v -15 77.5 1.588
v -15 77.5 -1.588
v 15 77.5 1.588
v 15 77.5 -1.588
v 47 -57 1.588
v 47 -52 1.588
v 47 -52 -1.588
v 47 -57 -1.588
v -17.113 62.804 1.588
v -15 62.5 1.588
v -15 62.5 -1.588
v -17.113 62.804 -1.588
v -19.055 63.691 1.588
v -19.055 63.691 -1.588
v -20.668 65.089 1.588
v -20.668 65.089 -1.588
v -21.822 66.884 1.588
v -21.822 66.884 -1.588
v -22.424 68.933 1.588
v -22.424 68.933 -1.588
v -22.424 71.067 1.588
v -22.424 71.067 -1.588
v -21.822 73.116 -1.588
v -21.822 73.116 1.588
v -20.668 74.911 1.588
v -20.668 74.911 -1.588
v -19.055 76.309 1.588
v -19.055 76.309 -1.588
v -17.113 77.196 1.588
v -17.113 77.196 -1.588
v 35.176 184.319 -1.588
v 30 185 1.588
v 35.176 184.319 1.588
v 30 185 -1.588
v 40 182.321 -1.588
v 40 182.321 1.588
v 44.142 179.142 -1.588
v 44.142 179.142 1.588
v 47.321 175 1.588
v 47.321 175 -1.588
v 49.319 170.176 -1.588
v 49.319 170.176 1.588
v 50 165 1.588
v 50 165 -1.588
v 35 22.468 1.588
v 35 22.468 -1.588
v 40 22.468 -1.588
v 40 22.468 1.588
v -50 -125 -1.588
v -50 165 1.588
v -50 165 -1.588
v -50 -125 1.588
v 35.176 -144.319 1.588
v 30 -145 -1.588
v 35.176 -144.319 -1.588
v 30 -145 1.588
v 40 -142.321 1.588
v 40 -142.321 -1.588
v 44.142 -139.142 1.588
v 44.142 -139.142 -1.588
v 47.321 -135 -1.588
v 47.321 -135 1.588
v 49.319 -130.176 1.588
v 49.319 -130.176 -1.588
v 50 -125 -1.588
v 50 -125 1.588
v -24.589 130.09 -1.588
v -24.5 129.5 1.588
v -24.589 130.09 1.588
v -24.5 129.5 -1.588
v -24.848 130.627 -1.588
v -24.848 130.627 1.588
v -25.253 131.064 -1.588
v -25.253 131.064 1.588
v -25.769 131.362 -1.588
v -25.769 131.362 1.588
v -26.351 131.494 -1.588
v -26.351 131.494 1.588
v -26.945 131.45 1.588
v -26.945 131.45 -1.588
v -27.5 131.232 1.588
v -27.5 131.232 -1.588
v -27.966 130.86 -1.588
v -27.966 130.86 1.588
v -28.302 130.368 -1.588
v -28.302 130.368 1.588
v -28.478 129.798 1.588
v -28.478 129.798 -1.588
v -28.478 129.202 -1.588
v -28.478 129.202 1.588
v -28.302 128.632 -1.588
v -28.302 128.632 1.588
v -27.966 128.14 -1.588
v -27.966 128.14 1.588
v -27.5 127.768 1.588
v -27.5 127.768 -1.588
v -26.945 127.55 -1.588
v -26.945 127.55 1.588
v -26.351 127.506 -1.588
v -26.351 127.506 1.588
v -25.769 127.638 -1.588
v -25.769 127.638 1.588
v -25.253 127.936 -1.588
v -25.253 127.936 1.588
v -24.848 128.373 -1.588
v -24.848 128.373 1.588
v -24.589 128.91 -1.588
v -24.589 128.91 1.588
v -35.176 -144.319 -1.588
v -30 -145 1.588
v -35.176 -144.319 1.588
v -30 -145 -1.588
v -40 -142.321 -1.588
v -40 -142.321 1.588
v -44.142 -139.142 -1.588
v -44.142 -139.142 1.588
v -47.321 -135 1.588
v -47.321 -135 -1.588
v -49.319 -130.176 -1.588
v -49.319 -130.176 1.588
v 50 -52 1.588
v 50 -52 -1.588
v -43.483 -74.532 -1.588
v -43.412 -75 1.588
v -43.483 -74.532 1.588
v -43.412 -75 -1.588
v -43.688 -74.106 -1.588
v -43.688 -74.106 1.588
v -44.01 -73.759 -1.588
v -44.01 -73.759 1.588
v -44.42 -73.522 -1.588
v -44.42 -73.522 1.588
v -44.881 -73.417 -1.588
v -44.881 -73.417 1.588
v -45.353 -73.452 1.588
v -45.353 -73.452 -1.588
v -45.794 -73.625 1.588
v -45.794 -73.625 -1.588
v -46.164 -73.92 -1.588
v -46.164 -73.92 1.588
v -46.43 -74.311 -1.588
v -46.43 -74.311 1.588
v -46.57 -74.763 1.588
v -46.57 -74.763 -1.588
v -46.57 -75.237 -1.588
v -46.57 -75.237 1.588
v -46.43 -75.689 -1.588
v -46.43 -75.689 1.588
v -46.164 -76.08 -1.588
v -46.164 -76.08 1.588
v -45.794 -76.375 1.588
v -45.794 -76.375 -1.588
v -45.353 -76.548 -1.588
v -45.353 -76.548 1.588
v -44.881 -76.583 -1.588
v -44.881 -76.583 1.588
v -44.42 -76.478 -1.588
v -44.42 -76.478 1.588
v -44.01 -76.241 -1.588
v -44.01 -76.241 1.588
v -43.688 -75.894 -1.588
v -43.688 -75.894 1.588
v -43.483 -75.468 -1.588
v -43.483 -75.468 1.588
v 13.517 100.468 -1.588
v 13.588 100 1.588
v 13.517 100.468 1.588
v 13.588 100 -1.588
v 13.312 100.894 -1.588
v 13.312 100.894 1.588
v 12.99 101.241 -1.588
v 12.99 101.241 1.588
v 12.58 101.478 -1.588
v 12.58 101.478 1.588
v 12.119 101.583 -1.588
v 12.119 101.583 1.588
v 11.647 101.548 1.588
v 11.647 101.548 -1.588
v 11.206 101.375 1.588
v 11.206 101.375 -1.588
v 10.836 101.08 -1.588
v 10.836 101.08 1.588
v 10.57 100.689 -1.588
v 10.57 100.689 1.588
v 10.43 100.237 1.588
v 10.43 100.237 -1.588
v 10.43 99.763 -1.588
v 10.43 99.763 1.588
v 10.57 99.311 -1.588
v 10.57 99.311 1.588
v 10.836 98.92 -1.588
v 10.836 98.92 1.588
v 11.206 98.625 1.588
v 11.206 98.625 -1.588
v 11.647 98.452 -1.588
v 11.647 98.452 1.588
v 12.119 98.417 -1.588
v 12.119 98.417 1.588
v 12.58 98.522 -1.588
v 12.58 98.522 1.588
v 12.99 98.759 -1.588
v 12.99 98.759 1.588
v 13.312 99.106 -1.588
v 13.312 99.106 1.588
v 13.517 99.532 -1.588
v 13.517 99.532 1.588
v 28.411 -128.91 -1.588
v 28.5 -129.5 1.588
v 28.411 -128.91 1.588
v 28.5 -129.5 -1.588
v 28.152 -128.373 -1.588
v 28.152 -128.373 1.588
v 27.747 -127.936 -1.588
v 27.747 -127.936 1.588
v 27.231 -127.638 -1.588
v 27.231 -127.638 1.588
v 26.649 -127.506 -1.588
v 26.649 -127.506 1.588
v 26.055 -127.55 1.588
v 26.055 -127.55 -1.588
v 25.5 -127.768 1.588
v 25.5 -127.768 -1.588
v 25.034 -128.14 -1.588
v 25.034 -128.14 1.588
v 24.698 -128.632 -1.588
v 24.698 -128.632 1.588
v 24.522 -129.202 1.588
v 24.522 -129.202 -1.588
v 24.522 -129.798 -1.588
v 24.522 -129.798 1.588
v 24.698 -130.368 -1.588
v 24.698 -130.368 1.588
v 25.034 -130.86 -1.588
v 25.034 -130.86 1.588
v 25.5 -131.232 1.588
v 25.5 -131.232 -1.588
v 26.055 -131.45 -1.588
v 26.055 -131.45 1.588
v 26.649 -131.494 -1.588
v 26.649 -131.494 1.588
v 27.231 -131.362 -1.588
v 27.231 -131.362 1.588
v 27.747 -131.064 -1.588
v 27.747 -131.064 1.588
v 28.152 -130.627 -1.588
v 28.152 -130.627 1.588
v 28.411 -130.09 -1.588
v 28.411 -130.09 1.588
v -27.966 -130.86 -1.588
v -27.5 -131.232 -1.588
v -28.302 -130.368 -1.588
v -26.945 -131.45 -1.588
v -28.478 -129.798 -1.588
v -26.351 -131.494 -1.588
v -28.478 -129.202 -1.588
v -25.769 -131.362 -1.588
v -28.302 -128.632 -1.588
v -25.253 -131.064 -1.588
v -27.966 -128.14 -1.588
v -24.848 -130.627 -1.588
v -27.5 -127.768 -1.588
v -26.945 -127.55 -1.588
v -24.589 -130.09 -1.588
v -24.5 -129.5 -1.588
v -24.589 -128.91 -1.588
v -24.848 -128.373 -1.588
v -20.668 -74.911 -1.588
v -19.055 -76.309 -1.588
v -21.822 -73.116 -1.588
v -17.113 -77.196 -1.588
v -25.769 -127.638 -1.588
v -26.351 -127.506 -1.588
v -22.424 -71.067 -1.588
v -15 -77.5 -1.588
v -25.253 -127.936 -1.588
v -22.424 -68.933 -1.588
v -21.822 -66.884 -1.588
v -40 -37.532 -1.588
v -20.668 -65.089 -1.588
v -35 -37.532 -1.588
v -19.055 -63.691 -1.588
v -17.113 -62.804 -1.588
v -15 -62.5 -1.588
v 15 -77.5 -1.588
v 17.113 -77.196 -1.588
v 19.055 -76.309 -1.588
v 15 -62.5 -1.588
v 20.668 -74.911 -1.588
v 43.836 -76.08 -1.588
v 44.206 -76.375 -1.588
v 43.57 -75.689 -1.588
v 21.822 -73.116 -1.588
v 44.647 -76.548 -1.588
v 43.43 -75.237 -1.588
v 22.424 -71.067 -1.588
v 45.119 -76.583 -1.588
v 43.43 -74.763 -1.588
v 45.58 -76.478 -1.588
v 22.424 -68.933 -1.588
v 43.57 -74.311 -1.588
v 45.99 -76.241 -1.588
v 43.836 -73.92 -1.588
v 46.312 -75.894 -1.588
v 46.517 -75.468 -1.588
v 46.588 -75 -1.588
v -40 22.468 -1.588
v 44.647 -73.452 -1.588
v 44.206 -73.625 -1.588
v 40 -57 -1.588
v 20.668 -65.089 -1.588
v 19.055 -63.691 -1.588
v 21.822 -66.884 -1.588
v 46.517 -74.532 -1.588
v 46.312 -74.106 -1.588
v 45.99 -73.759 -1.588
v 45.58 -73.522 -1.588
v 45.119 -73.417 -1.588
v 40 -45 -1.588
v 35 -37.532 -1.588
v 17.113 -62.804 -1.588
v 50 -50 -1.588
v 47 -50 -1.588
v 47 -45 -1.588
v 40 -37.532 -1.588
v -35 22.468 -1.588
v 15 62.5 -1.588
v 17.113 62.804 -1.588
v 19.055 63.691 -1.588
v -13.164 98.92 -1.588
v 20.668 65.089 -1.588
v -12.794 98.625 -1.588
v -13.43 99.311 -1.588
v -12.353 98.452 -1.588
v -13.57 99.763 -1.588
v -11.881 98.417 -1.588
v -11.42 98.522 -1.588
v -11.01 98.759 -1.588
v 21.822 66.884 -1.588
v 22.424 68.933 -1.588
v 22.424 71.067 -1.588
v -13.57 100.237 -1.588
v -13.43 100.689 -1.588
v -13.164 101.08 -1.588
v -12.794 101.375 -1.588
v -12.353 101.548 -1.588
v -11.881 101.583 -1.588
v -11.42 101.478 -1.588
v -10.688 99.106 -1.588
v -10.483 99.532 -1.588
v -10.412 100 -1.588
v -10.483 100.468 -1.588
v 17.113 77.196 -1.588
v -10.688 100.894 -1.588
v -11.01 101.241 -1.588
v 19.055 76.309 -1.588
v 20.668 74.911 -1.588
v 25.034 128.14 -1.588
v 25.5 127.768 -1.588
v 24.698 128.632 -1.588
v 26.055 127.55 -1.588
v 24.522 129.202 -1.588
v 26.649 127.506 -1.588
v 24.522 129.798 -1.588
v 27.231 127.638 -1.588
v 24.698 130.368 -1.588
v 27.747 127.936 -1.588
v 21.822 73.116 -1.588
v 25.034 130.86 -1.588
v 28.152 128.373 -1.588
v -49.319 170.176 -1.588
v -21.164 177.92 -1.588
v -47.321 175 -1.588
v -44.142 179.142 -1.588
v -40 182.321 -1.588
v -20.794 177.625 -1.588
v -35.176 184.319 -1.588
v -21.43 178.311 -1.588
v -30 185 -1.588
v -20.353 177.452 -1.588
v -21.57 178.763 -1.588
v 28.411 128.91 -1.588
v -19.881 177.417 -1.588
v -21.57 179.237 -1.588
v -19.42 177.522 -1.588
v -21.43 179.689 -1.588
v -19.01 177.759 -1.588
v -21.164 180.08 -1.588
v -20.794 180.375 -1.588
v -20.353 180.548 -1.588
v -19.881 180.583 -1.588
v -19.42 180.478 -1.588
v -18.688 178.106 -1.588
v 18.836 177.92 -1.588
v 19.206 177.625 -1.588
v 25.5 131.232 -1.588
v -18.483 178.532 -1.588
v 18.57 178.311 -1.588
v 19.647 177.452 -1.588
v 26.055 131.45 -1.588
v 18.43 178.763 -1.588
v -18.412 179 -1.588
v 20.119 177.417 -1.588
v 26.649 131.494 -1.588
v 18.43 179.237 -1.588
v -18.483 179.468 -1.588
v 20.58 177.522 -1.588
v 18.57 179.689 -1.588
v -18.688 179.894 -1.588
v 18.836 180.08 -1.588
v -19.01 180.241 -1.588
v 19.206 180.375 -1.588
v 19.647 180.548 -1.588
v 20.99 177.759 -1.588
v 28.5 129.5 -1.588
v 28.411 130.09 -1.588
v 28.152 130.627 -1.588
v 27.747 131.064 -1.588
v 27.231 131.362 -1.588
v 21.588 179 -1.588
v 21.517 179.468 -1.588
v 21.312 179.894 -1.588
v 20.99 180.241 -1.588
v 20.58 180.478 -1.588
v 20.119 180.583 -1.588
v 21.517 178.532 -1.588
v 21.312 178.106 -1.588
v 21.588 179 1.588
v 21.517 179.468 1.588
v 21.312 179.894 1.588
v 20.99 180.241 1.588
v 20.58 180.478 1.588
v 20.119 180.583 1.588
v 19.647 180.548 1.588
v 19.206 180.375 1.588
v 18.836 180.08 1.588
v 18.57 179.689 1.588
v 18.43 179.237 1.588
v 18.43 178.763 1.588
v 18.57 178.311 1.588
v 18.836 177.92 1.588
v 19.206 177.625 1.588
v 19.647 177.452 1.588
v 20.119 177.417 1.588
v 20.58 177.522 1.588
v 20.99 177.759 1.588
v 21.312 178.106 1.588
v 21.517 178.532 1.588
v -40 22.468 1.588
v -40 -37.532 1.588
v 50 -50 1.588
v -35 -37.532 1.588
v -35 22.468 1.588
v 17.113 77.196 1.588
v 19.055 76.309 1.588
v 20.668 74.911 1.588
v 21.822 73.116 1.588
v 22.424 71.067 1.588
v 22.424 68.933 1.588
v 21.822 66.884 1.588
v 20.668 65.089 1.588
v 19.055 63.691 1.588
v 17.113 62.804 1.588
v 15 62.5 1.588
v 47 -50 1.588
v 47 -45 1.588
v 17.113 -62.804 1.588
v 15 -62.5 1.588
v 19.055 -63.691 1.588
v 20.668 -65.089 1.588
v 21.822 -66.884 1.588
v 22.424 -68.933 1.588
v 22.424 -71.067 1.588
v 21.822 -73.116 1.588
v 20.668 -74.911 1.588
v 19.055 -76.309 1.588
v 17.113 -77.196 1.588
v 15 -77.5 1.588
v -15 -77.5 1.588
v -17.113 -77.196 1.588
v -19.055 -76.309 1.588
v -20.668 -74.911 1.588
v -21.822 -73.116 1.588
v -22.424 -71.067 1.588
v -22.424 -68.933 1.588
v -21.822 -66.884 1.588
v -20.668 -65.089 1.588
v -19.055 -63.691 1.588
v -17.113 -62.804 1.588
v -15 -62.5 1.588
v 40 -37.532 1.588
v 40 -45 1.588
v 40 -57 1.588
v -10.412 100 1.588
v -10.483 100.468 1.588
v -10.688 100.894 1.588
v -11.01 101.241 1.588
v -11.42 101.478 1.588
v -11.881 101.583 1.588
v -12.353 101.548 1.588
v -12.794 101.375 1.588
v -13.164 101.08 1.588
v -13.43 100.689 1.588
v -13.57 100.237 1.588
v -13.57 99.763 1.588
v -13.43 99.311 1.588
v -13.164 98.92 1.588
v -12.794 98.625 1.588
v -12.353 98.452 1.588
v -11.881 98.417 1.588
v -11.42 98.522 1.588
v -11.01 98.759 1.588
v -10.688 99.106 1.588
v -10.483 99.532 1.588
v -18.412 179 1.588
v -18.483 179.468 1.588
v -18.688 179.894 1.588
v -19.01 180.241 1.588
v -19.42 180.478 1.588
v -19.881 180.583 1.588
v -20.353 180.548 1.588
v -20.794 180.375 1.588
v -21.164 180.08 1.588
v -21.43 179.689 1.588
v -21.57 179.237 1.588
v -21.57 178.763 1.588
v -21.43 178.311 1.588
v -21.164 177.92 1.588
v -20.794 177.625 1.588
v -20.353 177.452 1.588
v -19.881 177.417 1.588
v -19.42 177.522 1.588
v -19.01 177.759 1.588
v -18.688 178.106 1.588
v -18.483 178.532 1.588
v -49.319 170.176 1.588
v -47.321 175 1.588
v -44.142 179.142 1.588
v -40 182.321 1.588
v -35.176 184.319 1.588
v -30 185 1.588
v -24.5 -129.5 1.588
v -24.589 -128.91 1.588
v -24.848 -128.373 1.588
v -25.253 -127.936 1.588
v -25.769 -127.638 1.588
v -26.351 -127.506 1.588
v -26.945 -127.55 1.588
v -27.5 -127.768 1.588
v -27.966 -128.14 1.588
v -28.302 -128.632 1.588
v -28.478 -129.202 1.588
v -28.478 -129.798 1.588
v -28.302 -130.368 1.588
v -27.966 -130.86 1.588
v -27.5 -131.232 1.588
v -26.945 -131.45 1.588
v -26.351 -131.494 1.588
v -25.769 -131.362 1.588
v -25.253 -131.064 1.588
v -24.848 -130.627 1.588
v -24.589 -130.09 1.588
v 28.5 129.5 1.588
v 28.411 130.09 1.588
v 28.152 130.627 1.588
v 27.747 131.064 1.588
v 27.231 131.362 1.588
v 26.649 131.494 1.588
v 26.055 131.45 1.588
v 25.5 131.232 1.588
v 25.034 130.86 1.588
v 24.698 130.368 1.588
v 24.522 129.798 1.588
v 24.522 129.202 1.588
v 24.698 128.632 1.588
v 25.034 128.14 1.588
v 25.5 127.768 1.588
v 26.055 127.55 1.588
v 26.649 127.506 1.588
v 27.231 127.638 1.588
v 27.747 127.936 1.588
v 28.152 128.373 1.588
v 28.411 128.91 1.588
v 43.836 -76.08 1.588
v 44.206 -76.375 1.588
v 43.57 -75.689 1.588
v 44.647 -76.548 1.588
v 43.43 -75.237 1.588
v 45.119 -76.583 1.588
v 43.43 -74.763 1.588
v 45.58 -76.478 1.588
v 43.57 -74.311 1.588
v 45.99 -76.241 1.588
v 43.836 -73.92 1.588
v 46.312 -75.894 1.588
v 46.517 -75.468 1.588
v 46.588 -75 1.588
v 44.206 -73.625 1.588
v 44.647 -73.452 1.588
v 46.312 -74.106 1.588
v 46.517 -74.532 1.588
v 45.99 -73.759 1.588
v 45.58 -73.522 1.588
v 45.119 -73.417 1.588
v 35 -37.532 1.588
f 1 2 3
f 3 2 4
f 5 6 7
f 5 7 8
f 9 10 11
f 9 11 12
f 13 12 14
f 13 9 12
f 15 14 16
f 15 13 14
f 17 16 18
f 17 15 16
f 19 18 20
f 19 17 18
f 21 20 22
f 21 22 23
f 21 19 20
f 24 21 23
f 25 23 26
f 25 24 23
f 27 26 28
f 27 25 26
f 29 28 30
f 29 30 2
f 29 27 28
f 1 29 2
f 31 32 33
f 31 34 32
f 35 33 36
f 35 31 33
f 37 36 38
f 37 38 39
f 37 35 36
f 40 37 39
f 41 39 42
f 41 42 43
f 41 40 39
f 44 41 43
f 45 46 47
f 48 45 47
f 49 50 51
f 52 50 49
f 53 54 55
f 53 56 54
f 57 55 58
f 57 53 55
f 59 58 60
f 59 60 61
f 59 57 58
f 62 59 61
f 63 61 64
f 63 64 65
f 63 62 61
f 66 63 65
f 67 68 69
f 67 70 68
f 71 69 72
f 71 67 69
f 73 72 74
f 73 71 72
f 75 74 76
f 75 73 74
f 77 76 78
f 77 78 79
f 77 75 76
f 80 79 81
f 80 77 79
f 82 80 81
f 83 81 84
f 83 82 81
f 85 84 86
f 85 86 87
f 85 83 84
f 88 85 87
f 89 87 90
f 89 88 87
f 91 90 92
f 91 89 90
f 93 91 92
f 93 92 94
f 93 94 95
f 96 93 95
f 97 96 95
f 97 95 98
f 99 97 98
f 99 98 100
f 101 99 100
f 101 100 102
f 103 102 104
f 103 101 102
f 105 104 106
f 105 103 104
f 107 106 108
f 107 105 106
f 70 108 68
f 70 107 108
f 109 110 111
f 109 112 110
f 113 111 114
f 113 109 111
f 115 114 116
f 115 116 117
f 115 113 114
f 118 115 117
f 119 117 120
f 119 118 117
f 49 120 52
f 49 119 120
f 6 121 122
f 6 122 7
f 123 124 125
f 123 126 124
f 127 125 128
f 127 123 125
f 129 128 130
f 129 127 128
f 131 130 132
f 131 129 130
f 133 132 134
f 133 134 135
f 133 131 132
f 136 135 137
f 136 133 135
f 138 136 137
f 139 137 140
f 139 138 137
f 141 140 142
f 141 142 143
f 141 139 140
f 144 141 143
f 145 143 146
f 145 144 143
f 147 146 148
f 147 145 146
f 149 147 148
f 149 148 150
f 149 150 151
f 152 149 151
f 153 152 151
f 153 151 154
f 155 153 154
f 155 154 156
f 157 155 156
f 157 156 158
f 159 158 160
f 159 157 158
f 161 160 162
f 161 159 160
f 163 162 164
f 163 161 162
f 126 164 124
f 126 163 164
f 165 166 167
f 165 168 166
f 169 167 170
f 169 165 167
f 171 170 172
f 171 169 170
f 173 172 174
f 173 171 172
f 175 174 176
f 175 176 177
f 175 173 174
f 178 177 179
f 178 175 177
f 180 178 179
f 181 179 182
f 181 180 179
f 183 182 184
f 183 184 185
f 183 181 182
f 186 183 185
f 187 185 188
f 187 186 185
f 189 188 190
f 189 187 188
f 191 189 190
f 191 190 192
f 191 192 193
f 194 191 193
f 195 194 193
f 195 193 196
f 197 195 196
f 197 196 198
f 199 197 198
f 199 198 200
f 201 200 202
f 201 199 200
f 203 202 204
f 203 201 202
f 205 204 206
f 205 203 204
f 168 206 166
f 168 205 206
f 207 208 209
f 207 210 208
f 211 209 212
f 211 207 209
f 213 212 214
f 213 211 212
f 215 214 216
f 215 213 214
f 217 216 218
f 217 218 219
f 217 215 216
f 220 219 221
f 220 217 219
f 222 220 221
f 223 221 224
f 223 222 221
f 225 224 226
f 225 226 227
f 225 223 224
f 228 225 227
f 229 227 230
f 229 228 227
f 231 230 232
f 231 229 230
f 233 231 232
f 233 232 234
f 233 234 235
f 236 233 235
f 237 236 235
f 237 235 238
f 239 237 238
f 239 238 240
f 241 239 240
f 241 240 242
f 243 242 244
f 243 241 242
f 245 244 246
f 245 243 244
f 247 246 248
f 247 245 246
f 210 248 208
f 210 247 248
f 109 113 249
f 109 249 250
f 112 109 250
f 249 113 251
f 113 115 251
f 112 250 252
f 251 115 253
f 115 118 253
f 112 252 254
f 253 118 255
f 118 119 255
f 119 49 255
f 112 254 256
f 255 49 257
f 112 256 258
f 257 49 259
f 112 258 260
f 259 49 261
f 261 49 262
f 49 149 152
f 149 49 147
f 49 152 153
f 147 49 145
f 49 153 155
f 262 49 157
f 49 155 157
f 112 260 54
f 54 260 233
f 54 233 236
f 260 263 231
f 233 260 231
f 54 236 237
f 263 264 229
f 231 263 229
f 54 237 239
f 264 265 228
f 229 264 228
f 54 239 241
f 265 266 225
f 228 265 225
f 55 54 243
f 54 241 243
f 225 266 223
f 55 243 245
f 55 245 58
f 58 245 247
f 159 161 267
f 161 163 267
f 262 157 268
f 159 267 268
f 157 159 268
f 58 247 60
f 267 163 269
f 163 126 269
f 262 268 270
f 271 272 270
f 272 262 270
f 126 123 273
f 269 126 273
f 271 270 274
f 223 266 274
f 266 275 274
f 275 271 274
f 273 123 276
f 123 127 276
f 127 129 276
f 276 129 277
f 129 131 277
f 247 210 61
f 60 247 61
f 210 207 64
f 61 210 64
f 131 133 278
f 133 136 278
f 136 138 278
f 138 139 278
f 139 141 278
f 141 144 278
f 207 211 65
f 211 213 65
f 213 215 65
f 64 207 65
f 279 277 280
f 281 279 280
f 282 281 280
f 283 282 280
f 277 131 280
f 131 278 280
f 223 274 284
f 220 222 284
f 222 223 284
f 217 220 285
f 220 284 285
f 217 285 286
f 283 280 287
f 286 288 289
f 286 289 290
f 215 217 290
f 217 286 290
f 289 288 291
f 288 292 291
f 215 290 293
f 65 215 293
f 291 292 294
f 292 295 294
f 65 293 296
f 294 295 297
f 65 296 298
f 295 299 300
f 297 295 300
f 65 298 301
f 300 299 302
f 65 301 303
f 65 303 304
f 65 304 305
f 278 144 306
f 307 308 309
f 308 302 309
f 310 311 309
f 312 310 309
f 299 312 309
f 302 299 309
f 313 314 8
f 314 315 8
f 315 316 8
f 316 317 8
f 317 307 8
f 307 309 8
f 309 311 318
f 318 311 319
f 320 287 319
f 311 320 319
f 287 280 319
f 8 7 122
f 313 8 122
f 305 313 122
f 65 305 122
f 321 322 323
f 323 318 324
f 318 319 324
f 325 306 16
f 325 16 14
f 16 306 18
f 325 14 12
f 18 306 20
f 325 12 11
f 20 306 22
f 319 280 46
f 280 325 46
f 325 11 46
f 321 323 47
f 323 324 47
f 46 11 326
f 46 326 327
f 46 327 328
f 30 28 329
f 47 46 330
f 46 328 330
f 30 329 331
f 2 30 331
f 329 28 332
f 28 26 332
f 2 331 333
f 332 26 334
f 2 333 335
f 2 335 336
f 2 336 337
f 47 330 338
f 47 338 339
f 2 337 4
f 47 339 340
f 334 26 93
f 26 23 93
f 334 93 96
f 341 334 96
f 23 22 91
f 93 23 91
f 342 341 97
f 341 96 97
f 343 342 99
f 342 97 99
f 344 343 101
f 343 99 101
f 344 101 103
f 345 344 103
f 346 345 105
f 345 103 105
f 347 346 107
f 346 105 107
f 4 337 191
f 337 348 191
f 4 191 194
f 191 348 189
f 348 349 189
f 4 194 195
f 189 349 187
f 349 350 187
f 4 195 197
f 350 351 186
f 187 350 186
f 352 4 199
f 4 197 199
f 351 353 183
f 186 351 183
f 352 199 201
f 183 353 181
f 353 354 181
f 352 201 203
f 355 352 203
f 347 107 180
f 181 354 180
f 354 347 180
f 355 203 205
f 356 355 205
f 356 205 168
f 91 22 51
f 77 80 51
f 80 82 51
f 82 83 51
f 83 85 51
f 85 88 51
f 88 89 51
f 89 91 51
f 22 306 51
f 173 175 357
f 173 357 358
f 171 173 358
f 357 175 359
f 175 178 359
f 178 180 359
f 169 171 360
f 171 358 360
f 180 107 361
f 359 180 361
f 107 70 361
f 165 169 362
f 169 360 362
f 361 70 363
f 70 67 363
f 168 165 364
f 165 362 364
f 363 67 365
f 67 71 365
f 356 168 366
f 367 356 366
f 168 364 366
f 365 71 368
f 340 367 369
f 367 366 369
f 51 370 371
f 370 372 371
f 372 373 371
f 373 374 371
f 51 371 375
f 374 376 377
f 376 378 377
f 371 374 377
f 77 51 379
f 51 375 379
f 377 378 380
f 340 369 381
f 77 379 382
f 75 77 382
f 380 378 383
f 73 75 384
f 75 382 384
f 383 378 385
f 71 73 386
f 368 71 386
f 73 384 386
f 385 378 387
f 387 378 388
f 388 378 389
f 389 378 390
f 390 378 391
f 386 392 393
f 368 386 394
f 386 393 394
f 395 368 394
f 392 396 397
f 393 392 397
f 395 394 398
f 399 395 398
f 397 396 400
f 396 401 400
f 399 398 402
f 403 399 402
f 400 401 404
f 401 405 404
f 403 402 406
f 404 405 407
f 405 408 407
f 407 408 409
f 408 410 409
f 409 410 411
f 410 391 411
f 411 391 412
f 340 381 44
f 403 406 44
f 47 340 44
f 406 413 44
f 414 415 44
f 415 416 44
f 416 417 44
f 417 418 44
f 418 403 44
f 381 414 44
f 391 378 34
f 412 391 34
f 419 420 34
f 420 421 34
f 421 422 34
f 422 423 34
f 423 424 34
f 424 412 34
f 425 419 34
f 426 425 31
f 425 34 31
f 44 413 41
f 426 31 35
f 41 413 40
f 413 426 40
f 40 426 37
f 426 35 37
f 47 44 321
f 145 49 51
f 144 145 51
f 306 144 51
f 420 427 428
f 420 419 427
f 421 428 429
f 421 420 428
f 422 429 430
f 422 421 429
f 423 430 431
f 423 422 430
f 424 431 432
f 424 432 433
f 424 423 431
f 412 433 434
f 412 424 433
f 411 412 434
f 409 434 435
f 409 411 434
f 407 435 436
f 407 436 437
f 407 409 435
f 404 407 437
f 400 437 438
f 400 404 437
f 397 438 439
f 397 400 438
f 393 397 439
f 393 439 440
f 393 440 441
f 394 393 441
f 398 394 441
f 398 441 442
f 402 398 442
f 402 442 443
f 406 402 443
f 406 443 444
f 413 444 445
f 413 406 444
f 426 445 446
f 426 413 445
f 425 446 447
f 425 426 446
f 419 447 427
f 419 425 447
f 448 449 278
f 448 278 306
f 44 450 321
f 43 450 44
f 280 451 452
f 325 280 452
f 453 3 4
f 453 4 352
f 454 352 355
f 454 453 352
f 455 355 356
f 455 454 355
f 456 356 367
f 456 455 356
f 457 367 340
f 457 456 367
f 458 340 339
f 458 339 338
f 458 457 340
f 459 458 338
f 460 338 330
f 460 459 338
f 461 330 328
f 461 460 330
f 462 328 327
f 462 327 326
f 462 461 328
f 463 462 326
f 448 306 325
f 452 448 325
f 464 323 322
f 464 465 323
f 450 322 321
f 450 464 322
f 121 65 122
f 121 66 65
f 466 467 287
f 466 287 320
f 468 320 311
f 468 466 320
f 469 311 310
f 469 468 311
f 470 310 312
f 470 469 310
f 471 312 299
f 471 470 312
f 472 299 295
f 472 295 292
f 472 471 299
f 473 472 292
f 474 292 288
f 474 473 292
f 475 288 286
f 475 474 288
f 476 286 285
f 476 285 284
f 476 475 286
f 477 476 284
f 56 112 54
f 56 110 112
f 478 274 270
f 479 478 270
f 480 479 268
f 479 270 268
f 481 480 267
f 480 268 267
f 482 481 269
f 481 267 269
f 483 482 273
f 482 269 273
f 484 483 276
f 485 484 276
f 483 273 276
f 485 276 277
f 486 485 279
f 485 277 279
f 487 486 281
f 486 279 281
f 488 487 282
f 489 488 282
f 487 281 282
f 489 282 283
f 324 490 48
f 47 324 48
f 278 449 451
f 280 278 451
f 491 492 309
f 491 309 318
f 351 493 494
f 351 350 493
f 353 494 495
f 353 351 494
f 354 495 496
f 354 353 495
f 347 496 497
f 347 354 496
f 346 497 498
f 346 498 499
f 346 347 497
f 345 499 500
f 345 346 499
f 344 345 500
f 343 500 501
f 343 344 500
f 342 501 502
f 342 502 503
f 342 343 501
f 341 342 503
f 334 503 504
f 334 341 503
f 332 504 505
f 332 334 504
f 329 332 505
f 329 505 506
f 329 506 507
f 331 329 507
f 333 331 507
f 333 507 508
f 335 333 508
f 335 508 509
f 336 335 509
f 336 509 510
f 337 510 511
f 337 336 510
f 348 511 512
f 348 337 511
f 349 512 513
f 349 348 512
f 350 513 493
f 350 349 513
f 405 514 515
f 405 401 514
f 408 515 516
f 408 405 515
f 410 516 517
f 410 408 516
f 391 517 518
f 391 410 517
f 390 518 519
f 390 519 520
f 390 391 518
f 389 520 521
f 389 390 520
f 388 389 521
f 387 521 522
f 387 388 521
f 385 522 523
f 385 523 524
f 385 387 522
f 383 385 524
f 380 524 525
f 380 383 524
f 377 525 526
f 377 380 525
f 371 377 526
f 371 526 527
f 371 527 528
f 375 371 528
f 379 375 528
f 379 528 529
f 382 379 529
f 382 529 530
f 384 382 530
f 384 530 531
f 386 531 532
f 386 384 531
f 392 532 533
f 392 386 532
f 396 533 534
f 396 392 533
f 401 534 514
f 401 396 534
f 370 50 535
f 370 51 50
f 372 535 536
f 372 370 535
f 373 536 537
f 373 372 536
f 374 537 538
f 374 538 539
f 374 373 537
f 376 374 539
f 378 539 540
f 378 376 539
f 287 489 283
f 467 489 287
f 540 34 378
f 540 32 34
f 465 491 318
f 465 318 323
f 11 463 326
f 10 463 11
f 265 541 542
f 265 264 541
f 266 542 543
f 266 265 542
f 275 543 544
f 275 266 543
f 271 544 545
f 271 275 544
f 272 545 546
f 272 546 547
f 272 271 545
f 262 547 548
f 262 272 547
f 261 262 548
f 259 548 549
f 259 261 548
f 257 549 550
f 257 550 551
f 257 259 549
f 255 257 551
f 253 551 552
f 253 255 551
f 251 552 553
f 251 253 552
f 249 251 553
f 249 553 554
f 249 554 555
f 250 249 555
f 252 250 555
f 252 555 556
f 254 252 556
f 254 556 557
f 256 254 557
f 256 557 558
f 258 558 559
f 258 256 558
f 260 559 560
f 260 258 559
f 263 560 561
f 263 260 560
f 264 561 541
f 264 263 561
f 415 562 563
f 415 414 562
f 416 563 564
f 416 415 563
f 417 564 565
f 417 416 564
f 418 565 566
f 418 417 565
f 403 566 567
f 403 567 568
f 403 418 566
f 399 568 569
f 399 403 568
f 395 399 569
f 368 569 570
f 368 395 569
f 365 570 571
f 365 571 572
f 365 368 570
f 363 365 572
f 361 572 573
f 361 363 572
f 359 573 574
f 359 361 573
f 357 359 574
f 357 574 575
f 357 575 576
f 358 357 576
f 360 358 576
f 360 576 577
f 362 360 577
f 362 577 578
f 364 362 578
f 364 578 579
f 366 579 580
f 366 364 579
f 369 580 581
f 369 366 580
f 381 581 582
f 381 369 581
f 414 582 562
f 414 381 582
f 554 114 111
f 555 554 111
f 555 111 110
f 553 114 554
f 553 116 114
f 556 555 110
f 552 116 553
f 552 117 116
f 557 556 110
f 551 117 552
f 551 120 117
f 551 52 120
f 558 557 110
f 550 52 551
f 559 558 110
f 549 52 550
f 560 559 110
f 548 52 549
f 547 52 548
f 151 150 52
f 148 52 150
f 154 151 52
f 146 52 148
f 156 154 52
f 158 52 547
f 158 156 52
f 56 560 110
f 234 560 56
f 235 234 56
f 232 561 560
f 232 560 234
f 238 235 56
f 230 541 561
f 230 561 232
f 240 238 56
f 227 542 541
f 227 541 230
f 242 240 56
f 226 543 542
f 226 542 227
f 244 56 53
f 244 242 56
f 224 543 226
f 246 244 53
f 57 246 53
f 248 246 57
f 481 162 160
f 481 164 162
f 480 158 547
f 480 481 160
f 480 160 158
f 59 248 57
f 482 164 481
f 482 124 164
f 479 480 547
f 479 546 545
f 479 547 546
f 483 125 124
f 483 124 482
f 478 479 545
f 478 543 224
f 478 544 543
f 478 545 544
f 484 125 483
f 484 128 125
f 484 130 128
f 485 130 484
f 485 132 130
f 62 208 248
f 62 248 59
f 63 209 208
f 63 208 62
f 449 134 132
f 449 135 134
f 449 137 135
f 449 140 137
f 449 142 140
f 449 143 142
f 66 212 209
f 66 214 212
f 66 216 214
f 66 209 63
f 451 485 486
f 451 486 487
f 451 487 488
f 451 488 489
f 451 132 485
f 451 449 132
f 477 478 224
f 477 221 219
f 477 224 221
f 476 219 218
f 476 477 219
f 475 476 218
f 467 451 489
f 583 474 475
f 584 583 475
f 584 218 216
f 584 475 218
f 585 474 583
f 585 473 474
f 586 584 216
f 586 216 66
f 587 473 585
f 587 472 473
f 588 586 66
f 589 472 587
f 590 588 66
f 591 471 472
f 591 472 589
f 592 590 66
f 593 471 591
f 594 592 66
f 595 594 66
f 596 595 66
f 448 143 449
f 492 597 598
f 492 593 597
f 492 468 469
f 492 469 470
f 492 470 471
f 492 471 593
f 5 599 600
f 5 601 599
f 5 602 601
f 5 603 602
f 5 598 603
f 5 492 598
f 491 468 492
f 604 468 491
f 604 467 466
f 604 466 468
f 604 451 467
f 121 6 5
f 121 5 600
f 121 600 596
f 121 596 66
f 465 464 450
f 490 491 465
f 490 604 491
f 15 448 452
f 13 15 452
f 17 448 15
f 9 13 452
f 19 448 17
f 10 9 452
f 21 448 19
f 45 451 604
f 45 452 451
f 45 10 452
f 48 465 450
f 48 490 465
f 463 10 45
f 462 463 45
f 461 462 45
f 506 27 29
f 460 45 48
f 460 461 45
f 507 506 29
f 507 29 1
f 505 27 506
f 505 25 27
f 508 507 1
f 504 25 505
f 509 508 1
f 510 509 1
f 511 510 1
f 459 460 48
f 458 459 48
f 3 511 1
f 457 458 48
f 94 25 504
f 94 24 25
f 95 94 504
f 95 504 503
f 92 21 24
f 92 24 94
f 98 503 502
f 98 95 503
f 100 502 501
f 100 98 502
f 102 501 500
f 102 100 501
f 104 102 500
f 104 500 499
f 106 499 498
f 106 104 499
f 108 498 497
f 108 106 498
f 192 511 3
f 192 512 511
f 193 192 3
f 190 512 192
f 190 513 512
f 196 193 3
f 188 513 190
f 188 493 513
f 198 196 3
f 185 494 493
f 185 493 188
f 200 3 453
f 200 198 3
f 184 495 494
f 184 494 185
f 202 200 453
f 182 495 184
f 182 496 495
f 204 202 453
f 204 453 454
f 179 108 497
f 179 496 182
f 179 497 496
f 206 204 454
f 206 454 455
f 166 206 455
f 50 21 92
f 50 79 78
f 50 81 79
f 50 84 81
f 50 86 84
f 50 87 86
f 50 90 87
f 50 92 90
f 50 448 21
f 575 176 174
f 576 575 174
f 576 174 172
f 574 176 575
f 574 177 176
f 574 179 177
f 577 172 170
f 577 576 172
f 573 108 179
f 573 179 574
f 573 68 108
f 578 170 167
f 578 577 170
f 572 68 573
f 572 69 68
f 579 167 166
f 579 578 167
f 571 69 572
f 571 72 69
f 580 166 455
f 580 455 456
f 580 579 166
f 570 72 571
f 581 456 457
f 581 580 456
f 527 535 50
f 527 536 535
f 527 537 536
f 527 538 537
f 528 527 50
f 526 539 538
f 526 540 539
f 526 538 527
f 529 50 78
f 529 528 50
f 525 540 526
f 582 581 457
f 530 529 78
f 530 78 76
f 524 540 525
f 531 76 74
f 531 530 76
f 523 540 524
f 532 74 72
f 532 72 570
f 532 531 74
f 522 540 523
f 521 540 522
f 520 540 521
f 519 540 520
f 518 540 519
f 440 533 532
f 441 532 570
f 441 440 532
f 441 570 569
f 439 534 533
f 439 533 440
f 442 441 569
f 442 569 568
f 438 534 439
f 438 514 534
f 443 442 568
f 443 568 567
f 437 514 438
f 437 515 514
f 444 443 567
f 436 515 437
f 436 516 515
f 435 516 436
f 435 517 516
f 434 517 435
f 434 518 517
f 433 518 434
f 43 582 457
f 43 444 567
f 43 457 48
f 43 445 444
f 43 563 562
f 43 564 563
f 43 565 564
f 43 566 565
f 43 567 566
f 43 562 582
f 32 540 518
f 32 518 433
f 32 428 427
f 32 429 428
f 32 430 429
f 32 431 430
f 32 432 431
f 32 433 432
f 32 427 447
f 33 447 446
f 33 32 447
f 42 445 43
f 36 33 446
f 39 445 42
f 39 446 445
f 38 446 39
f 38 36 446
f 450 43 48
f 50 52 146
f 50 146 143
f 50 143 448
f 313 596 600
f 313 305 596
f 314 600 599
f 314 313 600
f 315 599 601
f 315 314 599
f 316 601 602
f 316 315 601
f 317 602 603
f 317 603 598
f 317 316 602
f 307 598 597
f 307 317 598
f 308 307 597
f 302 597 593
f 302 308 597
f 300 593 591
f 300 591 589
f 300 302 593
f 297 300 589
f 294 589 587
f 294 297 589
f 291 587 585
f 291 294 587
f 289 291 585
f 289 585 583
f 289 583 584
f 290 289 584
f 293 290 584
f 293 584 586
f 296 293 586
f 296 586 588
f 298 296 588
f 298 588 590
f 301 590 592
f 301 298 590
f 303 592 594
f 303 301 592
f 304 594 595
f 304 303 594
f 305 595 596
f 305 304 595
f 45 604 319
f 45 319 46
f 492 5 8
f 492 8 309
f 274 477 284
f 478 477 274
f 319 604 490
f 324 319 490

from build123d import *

# Parameters (mm, degrees)
SKETCH1_R           = 2
SKETCH1_R_2         = 1.5875
SKETCH1_W           = 5
SKETCH1_H           = 60
BOSS_EXTRUDE1_DEPTH = 1.5875
FILLET1_R           = 20


with BuildPart() as part:
    # Sketch1 → Boss-Extrude1 (new body, symmetric)
    with BuildSketch(Plane.XY):
        Polygon((-50, -145), (50, -145), (50, -52), (47, -52), (47, -57), (40, -57), (40, -45), (47, -45), (47, -50), (50, -50), (50, 185), (-50, 185), align=None)
        with Locations((-26.5, -129.5)):
            Circle(SKETCH1_R, mode=Mode.SUBTRACT)
        with Locations((-45, -75)):
            Circle(SKETCH1_R_2, mode=Mode.SUBTRACT)
        with BuildLine():
            Line((15, -77.5), (-15, -77.5))
            ThreePointArc((-15, -77.5), (-22.5, -70), (-15, -62.5))
            Line((-15, -62.5), (15, -62.5))
            ThreePointArc((15, -62.5), (22.5, -70), (15, -77.5))
        make_face(mode=Mode.SUBTRACT)
        with Locations((-37.5, -7.531680382)):
            Rectangle(SKETCH1_W, SKETCH1_H, mode=Mode.SUBTRACT)
        with Locations((26.5, -129.5)):
            Circle(SKETCH1_R, mode=Mode.SUBTRACT)
        with Locations((45, -75)):
            Circle(SKETCH1_R_2, mode=Mode.SUBTRACT)
        with Locations((37.5, -7.531680382)):
            Rectangle(SKETCH1_W, SKETCH1_H, mode=Mode.SUBTRACT)
        with BuildLine():
            ThreePointArc((-15, 62.5), (-22.5, 70), (-15, 77.5))
            Line((-15, 77.5), (15, 77.5))
            ThreePointArc((15, 77.5), (22.5, 70), (15, 62.5))
            Line((15, 62.5), (-15, 62.5))
        make_face(mode=Mode.SUBTRACT)
        with Locations((-12, 100)):
            Circle(SKETCH1_R_2, mode=Mode.SUBTRACT)
        with Locations((-26.5, 129.5)):
            Circle(SKETCH1_R, mode=Mode.SUBTRACT)
        with Locations((12, 100)):
            Circle(SKETCH1_R_2, mode=Mode.SUBTRACT)
        with Locations((26.5, 129.5)):
            Circle(SKETCH1_R, mode=Mode.SUBTRACT)
        with Locations((20, 179)):
            Circle(SKETCH1_R_2, mode=Mode.SUBTRACT)
        with Locations((-20, 179)):
            Circle(SKETCH1_R_2, mode=Mode.SUBTRACT)
    extrude(amount=BOSS_EXTRUDE1_DEPTH, both=True)

    # Fillet1
    fillet1_edges = [part.edges().sort_by_distance(p)[0] for p in [
        (-50, 185, 0),
        (50, 185, 0),
        (-50, -145, 0),
        (50, -145, 0),
    ]]
    fillet(fillet1_edges, radius=FILLET1_R)


solid = part.part
